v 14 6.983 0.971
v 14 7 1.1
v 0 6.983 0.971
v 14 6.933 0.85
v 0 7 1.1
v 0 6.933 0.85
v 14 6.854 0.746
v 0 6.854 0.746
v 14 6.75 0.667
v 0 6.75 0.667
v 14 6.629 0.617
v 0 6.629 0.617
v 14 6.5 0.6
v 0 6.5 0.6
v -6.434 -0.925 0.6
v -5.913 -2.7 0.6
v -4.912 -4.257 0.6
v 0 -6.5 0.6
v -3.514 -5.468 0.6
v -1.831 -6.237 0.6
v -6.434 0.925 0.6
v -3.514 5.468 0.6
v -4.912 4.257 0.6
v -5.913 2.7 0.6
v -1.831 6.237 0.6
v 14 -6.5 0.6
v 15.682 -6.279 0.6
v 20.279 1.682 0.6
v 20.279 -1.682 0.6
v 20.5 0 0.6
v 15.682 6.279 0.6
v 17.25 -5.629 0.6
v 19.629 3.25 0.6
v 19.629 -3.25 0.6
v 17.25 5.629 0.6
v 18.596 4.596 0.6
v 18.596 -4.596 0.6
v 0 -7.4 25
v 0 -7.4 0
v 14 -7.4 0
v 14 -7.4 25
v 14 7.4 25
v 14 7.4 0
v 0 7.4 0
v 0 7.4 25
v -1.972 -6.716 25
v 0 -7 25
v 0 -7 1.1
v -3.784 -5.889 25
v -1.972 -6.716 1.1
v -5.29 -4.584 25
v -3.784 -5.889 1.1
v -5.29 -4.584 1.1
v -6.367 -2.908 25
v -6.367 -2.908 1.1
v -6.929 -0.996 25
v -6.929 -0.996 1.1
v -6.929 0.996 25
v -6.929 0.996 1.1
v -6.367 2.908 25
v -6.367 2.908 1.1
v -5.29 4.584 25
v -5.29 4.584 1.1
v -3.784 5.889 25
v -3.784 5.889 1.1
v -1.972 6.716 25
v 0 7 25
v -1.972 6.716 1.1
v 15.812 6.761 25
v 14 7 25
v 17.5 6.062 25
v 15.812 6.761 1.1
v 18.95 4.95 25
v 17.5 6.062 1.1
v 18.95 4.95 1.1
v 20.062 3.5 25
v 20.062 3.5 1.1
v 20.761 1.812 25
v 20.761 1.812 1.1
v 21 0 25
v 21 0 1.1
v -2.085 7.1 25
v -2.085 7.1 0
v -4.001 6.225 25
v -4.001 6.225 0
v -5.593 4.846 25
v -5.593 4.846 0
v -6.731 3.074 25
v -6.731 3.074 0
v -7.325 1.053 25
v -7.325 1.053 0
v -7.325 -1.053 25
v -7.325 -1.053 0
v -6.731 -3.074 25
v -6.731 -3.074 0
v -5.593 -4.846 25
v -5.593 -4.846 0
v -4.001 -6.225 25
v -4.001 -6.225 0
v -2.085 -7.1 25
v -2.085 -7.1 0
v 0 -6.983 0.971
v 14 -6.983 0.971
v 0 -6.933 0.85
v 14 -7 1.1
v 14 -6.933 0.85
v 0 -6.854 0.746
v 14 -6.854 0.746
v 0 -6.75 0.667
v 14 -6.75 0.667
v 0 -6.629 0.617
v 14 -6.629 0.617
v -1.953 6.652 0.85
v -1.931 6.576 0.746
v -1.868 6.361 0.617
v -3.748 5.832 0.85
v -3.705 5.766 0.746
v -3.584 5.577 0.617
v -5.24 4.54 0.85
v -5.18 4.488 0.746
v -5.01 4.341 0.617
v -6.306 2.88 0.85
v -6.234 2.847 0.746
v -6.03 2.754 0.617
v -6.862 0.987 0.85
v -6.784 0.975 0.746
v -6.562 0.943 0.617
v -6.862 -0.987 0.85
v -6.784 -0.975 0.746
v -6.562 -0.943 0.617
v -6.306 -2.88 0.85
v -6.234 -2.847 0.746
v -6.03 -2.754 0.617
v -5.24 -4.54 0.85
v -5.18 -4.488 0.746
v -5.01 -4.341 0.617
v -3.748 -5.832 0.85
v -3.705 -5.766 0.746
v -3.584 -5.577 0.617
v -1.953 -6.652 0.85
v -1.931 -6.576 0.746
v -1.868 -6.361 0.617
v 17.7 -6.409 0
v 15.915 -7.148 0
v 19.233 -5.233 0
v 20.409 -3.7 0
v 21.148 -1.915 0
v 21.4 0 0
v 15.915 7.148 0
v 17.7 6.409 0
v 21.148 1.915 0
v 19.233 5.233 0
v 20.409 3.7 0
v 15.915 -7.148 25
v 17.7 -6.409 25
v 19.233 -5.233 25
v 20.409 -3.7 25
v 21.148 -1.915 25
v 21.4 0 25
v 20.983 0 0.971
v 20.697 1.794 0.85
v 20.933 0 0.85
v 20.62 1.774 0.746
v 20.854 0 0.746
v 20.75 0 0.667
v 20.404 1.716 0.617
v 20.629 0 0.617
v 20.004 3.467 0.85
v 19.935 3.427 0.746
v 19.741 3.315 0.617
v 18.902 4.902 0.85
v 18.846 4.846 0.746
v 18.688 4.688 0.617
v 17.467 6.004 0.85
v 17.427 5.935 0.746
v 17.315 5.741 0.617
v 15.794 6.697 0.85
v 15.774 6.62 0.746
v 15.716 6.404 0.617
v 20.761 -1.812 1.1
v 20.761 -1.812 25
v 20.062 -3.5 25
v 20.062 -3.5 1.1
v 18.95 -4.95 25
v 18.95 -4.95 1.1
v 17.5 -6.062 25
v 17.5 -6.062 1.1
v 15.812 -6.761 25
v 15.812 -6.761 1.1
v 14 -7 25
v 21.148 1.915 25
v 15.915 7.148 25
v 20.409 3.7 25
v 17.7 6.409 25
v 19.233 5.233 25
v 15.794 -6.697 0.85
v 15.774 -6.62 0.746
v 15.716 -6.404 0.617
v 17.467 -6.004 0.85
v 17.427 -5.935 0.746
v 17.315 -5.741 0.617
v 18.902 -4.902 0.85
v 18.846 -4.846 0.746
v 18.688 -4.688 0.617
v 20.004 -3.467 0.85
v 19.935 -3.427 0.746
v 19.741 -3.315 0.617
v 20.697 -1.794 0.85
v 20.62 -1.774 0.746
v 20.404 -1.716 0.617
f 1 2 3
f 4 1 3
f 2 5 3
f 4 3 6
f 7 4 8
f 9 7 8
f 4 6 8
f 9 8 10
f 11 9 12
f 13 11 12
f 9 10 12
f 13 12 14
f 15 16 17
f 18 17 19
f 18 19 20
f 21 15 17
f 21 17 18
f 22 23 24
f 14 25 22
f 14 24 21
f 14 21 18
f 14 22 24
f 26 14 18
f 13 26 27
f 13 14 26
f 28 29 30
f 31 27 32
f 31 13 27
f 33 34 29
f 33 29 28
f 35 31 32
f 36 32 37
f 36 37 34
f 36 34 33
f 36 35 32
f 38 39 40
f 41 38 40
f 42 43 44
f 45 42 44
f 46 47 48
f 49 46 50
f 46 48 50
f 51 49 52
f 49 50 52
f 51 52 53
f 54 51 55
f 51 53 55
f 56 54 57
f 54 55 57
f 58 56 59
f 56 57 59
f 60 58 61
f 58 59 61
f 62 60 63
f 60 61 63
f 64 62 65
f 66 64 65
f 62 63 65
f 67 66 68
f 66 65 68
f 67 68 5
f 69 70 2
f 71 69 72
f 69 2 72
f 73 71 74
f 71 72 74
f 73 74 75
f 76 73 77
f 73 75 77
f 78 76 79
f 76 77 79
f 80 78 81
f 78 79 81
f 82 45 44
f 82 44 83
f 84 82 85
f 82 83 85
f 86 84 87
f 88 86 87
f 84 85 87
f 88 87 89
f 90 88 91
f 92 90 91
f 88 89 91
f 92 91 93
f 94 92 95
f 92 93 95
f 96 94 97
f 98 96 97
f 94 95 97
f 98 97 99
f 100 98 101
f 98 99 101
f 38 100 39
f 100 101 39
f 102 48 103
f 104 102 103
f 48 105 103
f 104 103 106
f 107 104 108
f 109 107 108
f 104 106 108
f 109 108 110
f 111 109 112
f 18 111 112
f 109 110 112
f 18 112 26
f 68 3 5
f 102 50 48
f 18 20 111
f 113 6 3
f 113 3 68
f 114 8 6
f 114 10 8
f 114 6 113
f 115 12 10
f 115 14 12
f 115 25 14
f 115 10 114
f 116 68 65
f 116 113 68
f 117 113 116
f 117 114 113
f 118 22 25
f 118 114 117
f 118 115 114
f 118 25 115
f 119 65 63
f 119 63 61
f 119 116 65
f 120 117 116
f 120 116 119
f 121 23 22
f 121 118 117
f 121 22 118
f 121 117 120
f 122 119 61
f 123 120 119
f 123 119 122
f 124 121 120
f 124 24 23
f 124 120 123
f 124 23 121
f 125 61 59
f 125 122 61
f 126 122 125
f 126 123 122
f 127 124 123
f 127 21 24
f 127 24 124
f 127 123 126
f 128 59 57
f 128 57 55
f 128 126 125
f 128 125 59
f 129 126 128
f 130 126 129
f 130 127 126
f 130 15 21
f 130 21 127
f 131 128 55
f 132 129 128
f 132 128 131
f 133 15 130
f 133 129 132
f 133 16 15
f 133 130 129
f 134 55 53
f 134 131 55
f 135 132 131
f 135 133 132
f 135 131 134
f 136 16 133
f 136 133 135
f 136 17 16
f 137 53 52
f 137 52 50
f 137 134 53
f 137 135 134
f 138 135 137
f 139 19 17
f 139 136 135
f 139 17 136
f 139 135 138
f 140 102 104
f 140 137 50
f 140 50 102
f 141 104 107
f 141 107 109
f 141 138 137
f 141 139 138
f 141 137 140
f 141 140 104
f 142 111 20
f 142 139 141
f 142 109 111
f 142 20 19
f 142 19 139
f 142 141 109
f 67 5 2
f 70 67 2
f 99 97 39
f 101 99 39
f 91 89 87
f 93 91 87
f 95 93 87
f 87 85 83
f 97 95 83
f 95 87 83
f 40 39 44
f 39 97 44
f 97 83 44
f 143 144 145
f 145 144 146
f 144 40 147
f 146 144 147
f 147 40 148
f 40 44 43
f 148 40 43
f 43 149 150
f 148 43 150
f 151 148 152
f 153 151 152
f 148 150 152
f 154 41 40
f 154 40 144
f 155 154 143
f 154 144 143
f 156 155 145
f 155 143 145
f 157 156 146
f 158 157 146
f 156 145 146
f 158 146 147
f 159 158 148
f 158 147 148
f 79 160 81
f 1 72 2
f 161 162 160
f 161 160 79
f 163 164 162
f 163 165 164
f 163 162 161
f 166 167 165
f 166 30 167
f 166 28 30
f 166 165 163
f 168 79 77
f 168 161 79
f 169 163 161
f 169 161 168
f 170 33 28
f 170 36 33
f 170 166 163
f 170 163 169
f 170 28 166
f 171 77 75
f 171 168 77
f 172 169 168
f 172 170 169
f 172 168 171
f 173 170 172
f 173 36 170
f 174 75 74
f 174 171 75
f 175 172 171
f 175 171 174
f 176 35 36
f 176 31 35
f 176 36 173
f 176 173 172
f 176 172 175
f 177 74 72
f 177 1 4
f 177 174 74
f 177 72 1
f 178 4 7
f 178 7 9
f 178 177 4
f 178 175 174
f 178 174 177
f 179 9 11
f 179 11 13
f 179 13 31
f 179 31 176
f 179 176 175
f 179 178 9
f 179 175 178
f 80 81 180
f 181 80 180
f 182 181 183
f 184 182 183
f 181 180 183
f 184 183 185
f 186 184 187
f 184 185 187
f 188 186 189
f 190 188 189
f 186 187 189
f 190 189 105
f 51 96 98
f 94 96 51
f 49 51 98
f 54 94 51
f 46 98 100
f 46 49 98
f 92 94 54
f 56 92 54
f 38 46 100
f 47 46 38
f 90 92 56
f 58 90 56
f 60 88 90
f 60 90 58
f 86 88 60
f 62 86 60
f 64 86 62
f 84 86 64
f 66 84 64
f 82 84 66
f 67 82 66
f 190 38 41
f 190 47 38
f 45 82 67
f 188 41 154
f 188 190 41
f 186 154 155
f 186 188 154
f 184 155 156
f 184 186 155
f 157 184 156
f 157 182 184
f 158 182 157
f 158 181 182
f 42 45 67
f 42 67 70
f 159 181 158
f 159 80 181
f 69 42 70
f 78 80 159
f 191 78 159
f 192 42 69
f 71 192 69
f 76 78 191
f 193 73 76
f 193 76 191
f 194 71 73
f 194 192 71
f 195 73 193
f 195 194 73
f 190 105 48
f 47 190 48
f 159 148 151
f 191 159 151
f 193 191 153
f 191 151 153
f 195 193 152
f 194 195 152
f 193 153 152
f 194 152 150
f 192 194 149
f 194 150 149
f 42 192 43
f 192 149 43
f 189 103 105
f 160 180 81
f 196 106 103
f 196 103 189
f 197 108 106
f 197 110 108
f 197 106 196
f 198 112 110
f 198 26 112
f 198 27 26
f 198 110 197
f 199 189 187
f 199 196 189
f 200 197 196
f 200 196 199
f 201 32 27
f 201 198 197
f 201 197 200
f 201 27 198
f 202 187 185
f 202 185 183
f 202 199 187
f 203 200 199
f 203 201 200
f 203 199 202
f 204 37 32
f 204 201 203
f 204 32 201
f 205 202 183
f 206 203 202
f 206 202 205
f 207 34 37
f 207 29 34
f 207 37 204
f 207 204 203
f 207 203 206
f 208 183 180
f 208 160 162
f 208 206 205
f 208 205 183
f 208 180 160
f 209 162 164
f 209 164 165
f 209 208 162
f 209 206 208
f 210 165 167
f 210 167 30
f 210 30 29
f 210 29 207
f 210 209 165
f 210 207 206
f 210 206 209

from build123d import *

# Parameters (mm, degrees)
F1_DEPTH = 25
F2_DEPTH = 0.6
F3_R     = 0.5


with BuildPart() as f1:
    # F0 (on Top) → F1 (new body)
    with BuildSketch(Plane.XY):
        with BuildLine():
            ThreePointArc((0, -7), (-7, 0), (0, 7))
            Line((0, 7), (2.4, 7))
            ThreePointArc((2.4, 7), (1.2165525061, 7.2993150364), (0, 7.4))
            ThreePointArc((0, 7.4), (-7.4, 0), (0, -7.4))
            ThreePointArc((0, -7.4), (1.2165525061, -7.2993150364), (2.4, -7))
            Line((2.4, -7), (0, -7))
        make_face()
        with BuildLine():
            ThreePointArc((0, 7.4), (1.2165525061, 7.2993150364), (2.4, 7))
            Line((2.4, 7), (11.6, 7))
            ThreePointArc((11.6, 7), (12.7834474939, 7.2993150364), (14, 7.4))
            Line((14, 7.4), (0, 7.4))
        make_face()
        with BuildLine():
            ThreePointArc((14, 7.4), (12.7834474939, 7.2993150364), (11.6, 7))
            Line((11.6, 7), (14, 7))
            ThreePointArc((14, 7), (18.9497474683, 4.9497474683), (21, 0))
            ThreePointArc((21, 0), (18.9497474683, -4.9497474683), (14, -7))
            Line((14, -7), (11.6, -7))
            ThreePointArc((11.6, -7), (12.7834474939, -7.2993150364), (14, -7.4))
            ThreePointArc((14, -7.4), (19.2325901808, -5.2325901808), (21.4, 0))
            ThreePointArc((21.4, 0), (19.2325901808, 5.2325901808), (14, 7.4))
        make_face()
        with BuildLine():
            Line((11.6, -7), (2.4, -7))
            ThreePointArc((2.4, -7), (1.2165525061, -7.2993150364), (0, -7.4))
            Line((0, -7.4), (14, -7.4))
            ThreePointArc((14, -7.4), (12.7834474939, -7.2993150364), (11.6, -7))
        make_face()
    extrude(amount=F1_DEPTH)

    # F0 (on Top) → F2 (join)
    with BuildSketch(Plane.XY):
        with BuildLine():
            ThreePointArc((6.7942857143, 1.6845419652), (4.3132473986, 5.5132473986), (0, 7))
            ThreePointArc((0, 7), (-7, 0), (0, -7))
            ThreePointArc((0, -7), (4.3132473986, -5.5132473986), (6.7942857143, -1.6845419652))
            ThreePointArc((6.7942857143, -1.6845419652), (6.6, 0), (6.7942857143, 1.6845419652))
        make_face()
        with BuildLine():
            ThreePointArc((7, -2.4), (5.2325901808, -5.2325901808), (2.4, -7))
            Line((2.4, -7), (11.6, -7))
            ThreePointArc((11.6, -7), (8.7674098192, -5.2325901808), (7, -2.4))
        make_face()
        with BuildLine():
            ThreePointArc((14, 7), (9.6867526014, 5.5132473986), (7.2057142857, 1.6845419652))
            ThreePointArc((7.2057142857, 1.6845419652), (7.3512681122, 0.8478544349), (7.4, 0))
            ThreePointArc((7.4, 0), (7.3512681122, -0.8478544349), (7.2057142857, -1.6845419652))
            ThreePointArc((7.2057142857, -1.6845419652), (9.6867526014, -5.5132473986), (14, -7))
            ThreePointArc((14, -7), (18.9497474683, -4.9497474683), (21, 0))
            ThreePointArc((21, 0), (18.9497474683, 4.9497474683), (14, 7))
        make_face()
        with BuildLine():
            ThreePointArc((6.7942857143, -1.6845419652), (4.3132473986, -5.5132473986), (0, -7))
            Line((0, -7), (2.4, -7))
            ThreePointArc((2.4, -7), (5.2325901808, -5.2325901808), (7, -2.4))
            ThreePointArc((7, -2.4), (6.8881402122, -2.044859496), (6.7942857143, -1.6845419652))
        make_face()
        with BuildLine():
            ThreePointArc((7.2057142857, -1.6845419652), (7.1118597878, -2.044859496), (7, -2.4))
            ThreePointArc((7, -2.4), (8.7674098192, -5.2325901808), (11.6, -7))
            Line((11.6, -7), (14, -7))
            ThreePointArc((14, -7), (9.6867526014, -5.5132473986), (7.2057142857, -1.6845419652))
        make_face()
        with BuildLine():
            ThreePointArc((7, 0), (6.9483811064, -0.8485281374), (6.7942857143, -1.6845419652))
            ThreePointArc((6.7942857143, -1.6845419652), (6.8881402122, -2.044859496), (7, -2.4))
            ThreePointArc((7, -2.4), (7.1118597878, -2.044859496), (7.2057142857, -1.6845419652))
            ThreePointArc((7.2057142857, -1.6845419652), (7.0516188936, -0.8485281374), (7, 0))
        make_face()
        with BuildLine():
            ThreePointArc((7.2057142857, 1.6845419652), (7.0516188936, 0.8485281374), (7, 0))
            ThreePointArc((7, 0), (7.0516188936, -0.8485281374), (7.2057142857, -1.6845419652))
            ThreePointArc((7.2057142857, -1.6845419652), (7.3512681122, -0.8478544349), (7.4, 0))
            ThreePointArc((7.4, 0), (7.3512681122, 0.8478544349), (7.2057142857, 1.6845419652))
        make_face()
        with BuildLine():
            ThreePointArc((7, 0), (6.9483811064, 0.8485281374), (6.7942857143, 1.6845419652))
            ThreePointArc((6.7942857143, 1.6845419652), (6.6, 0), (6.7942857143, -1.6845419652))
            ThreePointArc((6.7942857143, -1.6845419652), (6.9483811064, -0.8485281374), (7, 0))
        make_face()
        with BuildLine():
            Line((2.4, 7), (0, 7))
            ThreePointArc((0, 7), (4.3132473986, 5.5132473986), (6.7942857143, 1.6845419652))
            ThreePointArc((6.7942857143, 1.6845419652), (6.8881402122, 2.044859496), (7, 2.4))
            ThreePointArc((7, 2.4), (5.2325901808, 5.2325901808), (2.4, 7))
        make_face()
        with BuildLine():
            ThreePointArc((11.6, 7), (8.7674098192, 5.2325901808), (7, 2.4))
            ThreePointArc((7, 2.4), (7.1118597878, 2.044859496), (7.2057142857, 1.6845419652))
            ThreePointArc((7.2057142857, 1.6845419652), (9.6867526014, 5.5132473986), (14, 7))
            Line((14, 7), (11.6, 7))
        make_face()
        with BuildLine():
            ThreePointArc((7, 2.4), (6.8881402122, 2.044859496), (6.7942857143, 1.6845419652))
            ThreePointArc((6.7942857143, 1.6845419652), (6.9483811064, 0.8485281374), (7, 0))
            ThreePointArc((7, 0), (7.0516188936, 0.8485281374), (7.2057142857, 1.6845419652))
            ThreePointArc((7.2057142857, 1.6845419652), (7.1118597878, 2.044859496), (7, 2.4))
        make_face()
        with BuildLine():
            Line((11.6, 7), (2.4, 7))
            ThreePointArc((2.4, 7), (5.2325901808, 5.2325901808), (7, 2.4))
            ThreePointArc((7, 2.4), (8.7674098192, 5.2325901808), (11.6, 7))
        make_face()
    extrude(amount=F2_DEPTH)

    # F3
    f3_edges = [f1.edges().sort_by_distance(p)[0] for p in [
        (-7, 0, 0.6),
        (7, -7, 0.6),
        (21, 0, 0.6),
        (7, 7, 0.6),
    ]]
    fillet(f3_edges, radius=F3_R)


solid = f1.part
